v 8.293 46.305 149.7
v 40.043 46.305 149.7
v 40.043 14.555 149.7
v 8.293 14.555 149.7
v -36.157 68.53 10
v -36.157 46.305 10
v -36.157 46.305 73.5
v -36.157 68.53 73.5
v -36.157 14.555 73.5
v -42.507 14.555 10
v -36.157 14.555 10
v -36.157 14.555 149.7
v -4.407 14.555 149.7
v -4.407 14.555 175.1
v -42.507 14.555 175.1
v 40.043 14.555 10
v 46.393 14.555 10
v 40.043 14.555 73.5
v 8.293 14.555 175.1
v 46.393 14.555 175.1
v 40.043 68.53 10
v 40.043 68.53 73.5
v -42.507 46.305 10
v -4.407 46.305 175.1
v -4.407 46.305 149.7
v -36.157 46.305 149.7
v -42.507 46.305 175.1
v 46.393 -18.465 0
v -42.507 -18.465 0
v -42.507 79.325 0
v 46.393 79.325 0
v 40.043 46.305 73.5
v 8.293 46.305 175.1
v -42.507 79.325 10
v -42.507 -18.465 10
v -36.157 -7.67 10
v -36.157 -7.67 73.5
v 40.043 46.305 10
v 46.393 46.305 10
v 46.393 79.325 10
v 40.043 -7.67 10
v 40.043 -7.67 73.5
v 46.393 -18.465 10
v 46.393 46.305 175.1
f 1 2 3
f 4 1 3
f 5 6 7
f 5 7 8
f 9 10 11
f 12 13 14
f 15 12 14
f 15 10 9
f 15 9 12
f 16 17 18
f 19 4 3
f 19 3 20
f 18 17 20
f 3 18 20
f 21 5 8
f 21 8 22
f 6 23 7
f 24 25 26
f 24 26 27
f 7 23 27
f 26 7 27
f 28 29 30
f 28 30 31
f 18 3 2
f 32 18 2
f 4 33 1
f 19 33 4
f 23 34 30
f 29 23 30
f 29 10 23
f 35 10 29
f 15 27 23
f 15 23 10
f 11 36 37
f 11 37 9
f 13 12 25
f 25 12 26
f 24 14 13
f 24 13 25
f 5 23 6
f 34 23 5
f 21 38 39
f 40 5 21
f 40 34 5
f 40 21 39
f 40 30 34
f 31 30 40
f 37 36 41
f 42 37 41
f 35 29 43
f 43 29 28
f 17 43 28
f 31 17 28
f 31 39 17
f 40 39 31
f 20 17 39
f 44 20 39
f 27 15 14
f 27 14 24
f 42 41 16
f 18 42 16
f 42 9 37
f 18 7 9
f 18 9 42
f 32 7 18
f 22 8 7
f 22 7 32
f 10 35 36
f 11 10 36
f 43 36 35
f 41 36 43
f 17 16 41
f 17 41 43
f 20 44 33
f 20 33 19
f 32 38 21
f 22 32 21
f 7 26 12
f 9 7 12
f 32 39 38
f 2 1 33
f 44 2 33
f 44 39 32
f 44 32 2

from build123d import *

# Parameters (mm, degrees)
F0_W      = 88.9
F0_H      = 97.79
F1_DEPTH  = 10
F2_W      = 76.2
F2_H      = 76.2
F3_DEPTH  = 63.5
F4_W      = 31.75
F4_H      = 165.1
F5_DEPTH  = 6.35
F6_W      = 31.75
F6_H      = 101.6
F6_H_2    = 63.5
F7_DEPTH  = 6.35
F8_W      = 31.75
F8_H      = 25.4
F9_DEPTH  = 31.75
F10_W     = 31.75
F10_H     = 25.4
F11_DEPTH = 31.75


with BuildPart() as f1:
    # F0 (on Top) → F1 (new body)
    with BuildSketch(Plane.XY):
        with Locations((1.942618, 30.430211)):
            Rectangle(F0_W, F0_H)
    extrude(amount=F1_DEPTH)

    # F2 (on face) → F3 (join)
    with BuildSketch(Plane.XY.offset(10)):
        with Locations((1.942618, 30.430211)):
            Rectangle(F2_W, F2_H)
    extrude(amount=F3_DEPTH)

    # F4 (on face) → F5 (join)
    with BuildSketch(Plane.YZ.offset(40.042618)):
        with Locations((30.430211, 92.55)):
            Rectangle(F4_W, F4_H)
    extrude(amount=F5_DEPTH)

    # F6 (on face) → F7 (join)
    with BuildSketch(Plane(origin=(-36.157382, 0, 0), x_dir=(0, -1, 0), z_dir=(-1, 0, 0))):
        with Locations((-30.430211, 124.3)):
            Rectangle(F6_W, F6_H)
        with Locations((-30.430211, 41.75)):
            Rectangle(F6_W, F6_H_2)
    extrude(amount=F7_DEPTH)

    # F8 (on face) → F9 (join)
    with BuildSketch(Plane(origin=(40.042618, 0, 0), x_dir=(0, -1, 0), z_dir=(-1, 0, 0))):
        with Locations((-30.430211, 162.4)):
            Rectangle(F8_W, F8_H)
    extrude(amount=F9_DEPTH)

    # F10 (on face) → F11 (join)
    with BuildSketch(Plane.YZ.offset(-36.157382)):
        with Locations((30.430211, 162.4)):
            Rectangle(F10_W, F10_H)
    extrude(amount=F11_DEPTH)


solid = f1.part
